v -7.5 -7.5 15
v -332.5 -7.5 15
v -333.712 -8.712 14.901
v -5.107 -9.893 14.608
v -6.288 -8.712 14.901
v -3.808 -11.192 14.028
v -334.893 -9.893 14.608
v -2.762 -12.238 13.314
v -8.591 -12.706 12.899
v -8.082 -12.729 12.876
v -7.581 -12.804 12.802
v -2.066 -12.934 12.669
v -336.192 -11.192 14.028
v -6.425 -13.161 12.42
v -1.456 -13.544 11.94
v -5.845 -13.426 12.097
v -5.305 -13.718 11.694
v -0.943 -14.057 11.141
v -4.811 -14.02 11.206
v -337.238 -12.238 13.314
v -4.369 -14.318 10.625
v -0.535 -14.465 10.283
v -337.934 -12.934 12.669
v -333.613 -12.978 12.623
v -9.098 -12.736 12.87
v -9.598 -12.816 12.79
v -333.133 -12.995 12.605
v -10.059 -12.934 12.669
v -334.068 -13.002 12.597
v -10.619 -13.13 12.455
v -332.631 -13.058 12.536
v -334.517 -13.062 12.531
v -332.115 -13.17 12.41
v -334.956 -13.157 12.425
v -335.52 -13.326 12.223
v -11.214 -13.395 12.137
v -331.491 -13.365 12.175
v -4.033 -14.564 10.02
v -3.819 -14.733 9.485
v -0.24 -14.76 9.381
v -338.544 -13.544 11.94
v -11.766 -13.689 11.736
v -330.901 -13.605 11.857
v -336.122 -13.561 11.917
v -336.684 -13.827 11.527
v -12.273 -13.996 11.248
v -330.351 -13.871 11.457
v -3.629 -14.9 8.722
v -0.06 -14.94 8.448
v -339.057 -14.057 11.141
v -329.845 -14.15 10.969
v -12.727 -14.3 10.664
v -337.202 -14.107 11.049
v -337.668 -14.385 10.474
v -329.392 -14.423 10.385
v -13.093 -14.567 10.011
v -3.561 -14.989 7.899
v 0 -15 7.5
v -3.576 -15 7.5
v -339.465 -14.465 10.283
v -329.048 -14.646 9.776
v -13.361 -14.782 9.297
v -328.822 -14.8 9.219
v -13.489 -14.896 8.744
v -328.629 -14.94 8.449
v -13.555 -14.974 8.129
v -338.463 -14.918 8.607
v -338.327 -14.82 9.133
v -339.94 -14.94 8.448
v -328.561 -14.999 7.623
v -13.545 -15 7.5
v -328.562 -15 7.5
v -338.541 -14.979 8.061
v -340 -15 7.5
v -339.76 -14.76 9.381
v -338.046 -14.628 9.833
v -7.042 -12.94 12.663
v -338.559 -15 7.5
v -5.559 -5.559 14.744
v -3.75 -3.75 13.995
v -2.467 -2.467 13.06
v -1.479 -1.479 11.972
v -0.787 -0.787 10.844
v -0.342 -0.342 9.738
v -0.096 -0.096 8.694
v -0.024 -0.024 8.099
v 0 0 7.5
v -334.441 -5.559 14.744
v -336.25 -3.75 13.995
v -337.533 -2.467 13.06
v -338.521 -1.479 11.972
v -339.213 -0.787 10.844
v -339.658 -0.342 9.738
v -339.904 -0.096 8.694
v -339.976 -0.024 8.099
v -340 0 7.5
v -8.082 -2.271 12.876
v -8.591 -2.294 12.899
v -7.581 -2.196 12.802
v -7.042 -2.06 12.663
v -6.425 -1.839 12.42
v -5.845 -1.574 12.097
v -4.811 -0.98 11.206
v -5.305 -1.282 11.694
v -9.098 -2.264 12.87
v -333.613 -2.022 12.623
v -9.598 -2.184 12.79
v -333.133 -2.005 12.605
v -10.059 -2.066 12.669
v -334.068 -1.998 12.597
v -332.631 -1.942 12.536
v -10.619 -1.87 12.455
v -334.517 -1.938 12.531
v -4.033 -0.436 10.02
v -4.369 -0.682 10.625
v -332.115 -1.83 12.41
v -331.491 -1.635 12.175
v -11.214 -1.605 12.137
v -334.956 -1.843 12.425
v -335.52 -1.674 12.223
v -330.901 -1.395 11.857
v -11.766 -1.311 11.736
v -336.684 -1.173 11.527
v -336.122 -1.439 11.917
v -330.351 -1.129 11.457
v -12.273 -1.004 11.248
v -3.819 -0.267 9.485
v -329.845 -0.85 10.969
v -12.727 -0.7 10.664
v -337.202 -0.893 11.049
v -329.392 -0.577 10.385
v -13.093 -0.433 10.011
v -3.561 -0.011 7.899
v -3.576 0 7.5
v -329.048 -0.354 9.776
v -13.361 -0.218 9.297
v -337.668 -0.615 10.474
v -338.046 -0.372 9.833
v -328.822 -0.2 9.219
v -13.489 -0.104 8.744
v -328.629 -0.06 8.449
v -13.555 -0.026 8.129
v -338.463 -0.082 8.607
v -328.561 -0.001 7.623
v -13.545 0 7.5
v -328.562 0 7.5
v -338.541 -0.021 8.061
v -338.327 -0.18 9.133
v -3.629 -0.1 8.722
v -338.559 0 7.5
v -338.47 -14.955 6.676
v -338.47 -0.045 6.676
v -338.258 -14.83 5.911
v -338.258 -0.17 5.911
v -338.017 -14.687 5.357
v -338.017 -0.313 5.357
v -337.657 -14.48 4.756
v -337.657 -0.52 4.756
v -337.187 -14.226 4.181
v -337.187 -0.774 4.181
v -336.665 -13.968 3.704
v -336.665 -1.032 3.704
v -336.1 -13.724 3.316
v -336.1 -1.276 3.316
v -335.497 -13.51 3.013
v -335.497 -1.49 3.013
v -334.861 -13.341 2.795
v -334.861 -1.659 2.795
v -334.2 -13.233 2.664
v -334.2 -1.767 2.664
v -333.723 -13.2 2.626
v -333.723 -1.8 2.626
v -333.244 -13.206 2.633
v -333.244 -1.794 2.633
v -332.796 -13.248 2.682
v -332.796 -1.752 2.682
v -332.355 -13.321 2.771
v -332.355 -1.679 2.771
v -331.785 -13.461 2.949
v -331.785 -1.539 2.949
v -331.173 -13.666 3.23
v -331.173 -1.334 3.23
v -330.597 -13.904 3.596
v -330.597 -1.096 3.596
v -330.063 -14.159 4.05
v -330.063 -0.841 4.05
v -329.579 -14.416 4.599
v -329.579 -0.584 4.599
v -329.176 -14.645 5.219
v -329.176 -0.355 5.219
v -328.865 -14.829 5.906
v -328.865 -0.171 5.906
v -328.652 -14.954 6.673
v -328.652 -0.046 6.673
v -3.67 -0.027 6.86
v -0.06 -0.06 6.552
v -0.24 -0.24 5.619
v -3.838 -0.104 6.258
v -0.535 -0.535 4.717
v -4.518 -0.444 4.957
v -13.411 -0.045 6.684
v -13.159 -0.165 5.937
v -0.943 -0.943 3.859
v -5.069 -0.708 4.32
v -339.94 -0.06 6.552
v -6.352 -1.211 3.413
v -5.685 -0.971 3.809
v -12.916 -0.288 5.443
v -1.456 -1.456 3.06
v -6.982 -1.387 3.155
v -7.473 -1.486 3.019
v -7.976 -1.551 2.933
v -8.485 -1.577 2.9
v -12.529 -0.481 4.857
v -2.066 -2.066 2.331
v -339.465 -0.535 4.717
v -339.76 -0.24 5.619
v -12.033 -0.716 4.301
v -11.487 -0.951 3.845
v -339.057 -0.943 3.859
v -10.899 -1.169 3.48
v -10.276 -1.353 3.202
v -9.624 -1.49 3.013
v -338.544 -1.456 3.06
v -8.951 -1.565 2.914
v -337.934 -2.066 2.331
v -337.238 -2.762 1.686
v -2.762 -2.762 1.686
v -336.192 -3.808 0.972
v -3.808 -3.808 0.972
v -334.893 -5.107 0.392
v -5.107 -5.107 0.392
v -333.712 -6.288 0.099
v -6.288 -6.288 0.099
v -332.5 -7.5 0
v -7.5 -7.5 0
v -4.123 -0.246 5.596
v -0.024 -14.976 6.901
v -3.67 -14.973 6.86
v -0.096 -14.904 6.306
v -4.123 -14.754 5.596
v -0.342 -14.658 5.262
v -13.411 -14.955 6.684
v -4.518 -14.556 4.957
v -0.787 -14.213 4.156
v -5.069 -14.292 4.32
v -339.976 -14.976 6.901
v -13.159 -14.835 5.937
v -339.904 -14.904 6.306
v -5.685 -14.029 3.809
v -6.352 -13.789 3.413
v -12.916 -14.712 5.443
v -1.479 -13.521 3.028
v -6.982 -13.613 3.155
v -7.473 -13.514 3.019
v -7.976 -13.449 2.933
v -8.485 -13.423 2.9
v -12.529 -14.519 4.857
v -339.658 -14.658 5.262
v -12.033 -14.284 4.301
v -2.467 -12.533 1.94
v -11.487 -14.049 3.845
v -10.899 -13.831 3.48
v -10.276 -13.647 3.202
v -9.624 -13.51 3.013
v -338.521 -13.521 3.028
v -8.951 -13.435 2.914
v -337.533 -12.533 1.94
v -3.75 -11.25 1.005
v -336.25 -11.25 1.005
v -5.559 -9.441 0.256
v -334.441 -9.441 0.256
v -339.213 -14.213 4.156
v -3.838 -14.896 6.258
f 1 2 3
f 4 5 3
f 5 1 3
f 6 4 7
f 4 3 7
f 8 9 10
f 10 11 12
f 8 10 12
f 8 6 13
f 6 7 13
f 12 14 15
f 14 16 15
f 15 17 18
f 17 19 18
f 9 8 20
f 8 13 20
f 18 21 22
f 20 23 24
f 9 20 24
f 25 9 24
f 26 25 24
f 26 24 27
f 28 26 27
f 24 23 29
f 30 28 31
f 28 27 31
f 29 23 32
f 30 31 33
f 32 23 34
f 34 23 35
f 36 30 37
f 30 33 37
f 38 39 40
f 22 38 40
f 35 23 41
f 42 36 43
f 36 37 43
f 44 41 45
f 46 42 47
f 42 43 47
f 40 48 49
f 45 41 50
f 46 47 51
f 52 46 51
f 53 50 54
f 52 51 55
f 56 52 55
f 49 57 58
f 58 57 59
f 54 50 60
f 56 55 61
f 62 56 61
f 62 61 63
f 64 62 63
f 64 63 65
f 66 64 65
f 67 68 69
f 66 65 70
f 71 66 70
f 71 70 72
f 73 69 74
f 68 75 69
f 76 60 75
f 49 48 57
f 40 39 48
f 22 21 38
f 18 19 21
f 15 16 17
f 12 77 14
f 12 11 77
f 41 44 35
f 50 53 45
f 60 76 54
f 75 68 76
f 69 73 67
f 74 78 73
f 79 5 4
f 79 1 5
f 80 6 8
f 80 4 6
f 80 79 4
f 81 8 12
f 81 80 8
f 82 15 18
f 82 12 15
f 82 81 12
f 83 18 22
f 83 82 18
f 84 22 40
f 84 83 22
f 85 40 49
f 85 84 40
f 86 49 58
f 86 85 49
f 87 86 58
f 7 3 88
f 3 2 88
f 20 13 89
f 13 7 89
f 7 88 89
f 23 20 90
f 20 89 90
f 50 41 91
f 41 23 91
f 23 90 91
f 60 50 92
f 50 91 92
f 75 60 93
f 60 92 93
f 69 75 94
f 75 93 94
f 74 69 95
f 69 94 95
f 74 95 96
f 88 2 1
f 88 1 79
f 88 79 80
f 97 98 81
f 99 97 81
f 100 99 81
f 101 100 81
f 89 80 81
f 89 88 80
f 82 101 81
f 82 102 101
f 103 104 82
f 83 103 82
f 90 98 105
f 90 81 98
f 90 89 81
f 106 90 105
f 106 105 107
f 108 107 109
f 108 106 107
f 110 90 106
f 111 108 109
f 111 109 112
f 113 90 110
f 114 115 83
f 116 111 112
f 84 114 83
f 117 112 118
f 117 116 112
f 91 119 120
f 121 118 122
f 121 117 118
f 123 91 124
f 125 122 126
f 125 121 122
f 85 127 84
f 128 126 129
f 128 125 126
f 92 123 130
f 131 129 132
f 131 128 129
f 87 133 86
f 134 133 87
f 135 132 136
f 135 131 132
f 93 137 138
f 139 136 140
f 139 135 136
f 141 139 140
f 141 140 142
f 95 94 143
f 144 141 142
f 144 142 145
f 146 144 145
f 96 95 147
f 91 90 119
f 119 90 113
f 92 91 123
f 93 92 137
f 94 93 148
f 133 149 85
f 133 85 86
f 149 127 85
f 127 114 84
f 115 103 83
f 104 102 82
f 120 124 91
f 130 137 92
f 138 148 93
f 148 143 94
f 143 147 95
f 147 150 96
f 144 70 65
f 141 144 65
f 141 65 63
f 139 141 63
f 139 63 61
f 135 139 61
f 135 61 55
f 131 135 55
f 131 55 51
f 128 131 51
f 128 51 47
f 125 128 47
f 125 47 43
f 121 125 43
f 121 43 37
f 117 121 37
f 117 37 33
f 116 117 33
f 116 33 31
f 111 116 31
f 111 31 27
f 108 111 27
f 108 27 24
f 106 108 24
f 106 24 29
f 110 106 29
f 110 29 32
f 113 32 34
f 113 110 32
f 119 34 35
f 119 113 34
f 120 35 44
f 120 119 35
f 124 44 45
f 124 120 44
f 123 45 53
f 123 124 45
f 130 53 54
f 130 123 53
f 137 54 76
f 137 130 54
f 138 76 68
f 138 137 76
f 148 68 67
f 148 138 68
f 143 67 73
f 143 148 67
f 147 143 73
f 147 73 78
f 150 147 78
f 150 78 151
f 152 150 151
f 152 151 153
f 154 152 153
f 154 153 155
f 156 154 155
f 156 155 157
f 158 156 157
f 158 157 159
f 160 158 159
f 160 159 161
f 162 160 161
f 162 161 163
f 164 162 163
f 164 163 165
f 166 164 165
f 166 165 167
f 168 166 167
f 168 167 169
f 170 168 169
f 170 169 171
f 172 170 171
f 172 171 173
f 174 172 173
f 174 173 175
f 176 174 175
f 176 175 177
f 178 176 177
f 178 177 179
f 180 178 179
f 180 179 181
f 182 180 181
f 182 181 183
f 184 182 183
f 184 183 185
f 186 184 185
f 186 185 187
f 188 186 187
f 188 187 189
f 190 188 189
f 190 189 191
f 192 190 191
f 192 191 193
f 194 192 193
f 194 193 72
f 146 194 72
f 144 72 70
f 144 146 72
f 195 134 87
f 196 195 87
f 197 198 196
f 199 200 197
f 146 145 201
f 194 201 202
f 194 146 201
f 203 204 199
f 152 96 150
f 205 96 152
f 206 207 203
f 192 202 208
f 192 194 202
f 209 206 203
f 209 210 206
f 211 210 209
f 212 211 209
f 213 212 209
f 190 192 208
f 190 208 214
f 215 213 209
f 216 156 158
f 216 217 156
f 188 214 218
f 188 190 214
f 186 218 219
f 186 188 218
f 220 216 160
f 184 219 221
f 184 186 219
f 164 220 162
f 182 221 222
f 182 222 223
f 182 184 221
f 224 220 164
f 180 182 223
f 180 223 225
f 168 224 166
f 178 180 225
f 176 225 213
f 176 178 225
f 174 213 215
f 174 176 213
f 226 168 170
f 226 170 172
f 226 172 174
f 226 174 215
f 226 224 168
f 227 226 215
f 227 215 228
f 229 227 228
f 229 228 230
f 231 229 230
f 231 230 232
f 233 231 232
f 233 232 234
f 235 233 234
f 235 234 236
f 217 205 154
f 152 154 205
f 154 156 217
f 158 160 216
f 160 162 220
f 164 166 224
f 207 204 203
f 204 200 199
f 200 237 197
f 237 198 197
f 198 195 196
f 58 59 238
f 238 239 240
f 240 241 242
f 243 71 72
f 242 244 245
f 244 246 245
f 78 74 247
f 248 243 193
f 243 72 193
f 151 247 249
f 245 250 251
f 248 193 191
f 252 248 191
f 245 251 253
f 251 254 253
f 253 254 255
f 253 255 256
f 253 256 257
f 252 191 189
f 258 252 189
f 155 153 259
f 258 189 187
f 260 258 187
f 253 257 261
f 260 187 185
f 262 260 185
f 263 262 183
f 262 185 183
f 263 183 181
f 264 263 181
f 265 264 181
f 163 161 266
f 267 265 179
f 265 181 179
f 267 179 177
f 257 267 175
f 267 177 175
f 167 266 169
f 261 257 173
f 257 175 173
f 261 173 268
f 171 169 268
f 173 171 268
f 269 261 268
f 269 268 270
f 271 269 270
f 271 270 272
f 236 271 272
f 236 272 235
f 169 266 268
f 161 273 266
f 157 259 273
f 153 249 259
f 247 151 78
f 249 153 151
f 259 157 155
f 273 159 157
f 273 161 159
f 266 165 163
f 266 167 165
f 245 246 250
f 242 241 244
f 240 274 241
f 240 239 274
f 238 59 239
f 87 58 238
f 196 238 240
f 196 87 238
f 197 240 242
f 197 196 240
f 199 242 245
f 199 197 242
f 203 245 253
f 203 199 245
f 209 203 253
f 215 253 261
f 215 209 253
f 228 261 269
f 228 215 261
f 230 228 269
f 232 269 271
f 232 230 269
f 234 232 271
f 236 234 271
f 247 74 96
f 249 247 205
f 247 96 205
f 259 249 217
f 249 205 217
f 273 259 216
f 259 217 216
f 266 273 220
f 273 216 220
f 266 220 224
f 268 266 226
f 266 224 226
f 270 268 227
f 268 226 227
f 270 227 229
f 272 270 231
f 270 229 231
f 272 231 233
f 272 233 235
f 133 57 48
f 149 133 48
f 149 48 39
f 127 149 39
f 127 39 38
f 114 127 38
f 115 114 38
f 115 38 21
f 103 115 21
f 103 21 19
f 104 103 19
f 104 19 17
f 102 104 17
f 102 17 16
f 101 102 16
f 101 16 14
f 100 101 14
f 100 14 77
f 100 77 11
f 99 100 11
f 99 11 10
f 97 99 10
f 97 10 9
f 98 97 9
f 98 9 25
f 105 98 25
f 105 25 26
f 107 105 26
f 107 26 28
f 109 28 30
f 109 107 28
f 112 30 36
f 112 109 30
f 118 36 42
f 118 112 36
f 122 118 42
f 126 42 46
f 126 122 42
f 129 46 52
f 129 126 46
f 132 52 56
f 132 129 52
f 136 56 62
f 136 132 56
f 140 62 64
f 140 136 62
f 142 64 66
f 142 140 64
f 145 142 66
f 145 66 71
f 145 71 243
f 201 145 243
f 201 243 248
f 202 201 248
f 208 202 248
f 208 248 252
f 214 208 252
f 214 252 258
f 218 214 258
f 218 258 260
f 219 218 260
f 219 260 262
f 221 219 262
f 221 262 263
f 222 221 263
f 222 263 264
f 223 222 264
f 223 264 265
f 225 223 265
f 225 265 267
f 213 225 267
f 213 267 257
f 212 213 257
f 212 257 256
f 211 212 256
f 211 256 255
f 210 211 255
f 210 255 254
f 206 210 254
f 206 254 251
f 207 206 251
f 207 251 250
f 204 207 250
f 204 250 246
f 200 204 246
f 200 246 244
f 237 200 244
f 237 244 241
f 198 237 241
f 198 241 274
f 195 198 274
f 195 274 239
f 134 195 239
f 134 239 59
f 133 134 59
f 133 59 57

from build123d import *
from build123d import SkipClean  # not in build123d's __all__

# Parameters (mm, degrees)
F0_W        = 340
F0_H        = 15
F1_DEPTH    = 15
F2_R        = 5
F3_DEPTH    = 20
F4_T1_DEPTH = 377.5
F4_T3_DEPTH = 52.5


# Not quite as in the source:
# - a fillet or chamfer that OpenCascade refuses, or shapes differently, is made with other operations: its cross-section is extruded or revolved along the edge and cut away or added


with BuildPart() as f1:
    # F0 (on Front) → F1 (new body)
    with BuildSketch(Plane.XZ):
        with Locations((-170, 7.5)):
            Rectangle(F0_W, F0_H)
    extrude(amount=F1_DEPTH)

    # F2 (on Front) → F3 (cut)
    with BuildSketch(Plane.XZ):
        with Locations((-333.5605150089, 7.6230808641)):
            Circle(F2_R)
        with Locations((-8.5605150089, 7.8990953043)):
            Circle(F2_R)
    extrude(amount=F3_DEPTH, mode=Mode.SUBTRACT)

    # F4: fillet of radius 7.5 on 8 edges, made by hand

    # F4_s2 → F4_t1 (cut)
    with BuildSketch(Plane.YZ.offset(-358.75)):
        with BuildLine():
            ThreePointArc((-7.5, 15), (-2.1966991411, 12.8033008589), (0, 7.5))
            Line((0, 7.5), (0, 15))
            Line((0, 15), (-7.5, 15))
        make_face()
        with BuildLine():
            ThreePointArc((0, 7.5), (-2.1966991411, 2.1966991411), (-7.5, 0))
            Line((-7.5, 0), (0, 0))
            Line((0, 0), (0, 7.5))
        make_face()
        with BuildLine():
            ThreePointArc((-7.5, 15), (-12.8033008589, 12.8033008589), (-15, 7.5))
            Line((-15, 7.5), (-15, 15))
            Line((-15, 15), (-7.5, 15))
        make_face()
        with BuildLine():
            ThreePointArc((-15, 7.5), (-12.8033008589, 2.1966991411), (-7.5, 0))
            Line((-7.5, 0), (-15, 0))
            Line((-15, 0), (-15, 7.5))
        make_face()
    with SkipClean():  # cleaning this boolean's faces spoils the solid; the shape is the same uncleaned
        extrude(amount=F4_T1_DEPTH, mode=Mode.SUBTRACT)

    # F4_s4 → F4_t3 (cut)
    with BuildSketch(Plane.XZ.offset(-18.75)):
        with BuildLine():
            ThreePointArc((-7.5, 15), (-2.1966991411, 12.8033008589), (0, 7.5))
            Line((0, 7.5), (0, 15))
            Line((0, 15), (-7.5, 15))
        make_face()
        with BuildLine():
            ThreePointArc((0, 7.5), (-2.1966991411, 2.1966991411), (-7.5, 0))
            Line((-7.5, 0), (0, 0))
            Line((0, 0), (0, 7.5))
        make_face()
        with BuildLine():
            ThreePointArc((-332.5, 15), (-337.8033008589, 12.8033008589), (-340, 7.5))
            Line((-340, 7.5), (-340, 15))
            Line((-340, 15), (-332.5, 15))
        make_face()
        with BuildLine():
            ThreePointArc((-340, 7.5), (-337.8033008589, 2.1966991411), (-332.5, 0))
            Line((-332.5, 0), (-340, 0))
            Line((-340, 0), (-340, 7.5))
        make_face()
    with SkipClean():  # cleaning this boolean's faces spoils the solid; the shape is the same uncleaned
        extrude(amount=F4_T3_DEPTH, mode=Mode.SUBTRACT)


solid = f1.part
